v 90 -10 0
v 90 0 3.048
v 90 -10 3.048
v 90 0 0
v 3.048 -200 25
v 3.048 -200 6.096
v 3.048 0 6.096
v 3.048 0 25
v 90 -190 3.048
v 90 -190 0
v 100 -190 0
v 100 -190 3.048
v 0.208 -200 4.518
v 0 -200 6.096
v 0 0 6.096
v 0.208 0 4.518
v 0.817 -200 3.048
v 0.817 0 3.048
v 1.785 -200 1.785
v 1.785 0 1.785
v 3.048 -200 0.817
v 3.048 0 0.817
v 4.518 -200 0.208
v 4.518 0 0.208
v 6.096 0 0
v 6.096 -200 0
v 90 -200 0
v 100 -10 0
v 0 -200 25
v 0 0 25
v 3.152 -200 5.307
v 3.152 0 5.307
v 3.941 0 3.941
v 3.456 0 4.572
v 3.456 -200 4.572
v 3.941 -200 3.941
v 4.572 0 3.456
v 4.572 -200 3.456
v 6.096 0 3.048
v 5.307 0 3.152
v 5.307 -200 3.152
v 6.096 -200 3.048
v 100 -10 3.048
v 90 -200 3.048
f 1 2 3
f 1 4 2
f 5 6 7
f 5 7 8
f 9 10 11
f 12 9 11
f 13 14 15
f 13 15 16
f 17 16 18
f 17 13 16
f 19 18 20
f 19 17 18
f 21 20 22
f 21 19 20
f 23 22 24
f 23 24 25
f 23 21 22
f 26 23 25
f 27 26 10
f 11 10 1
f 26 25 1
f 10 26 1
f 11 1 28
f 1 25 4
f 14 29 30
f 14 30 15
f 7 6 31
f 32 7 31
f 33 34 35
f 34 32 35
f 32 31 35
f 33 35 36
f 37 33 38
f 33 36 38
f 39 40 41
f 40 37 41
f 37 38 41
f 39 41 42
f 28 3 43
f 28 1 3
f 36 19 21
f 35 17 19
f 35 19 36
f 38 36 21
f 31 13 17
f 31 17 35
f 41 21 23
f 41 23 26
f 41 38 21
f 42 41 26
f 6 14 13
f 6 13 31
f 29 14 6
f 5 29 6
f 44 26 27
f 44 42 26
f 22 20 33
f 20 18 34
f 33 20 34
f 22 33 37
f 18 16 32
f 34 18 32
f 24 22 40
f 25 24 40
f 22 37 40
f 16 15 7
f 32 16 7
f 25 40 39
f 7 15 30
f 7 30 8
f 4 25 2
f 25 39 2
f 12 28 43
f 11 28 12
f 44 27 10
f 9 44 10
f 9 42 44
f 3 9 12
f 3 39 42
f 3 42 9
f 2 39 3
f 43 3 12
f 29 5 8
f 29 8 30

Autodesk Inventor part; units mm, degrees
ref_plane "YZ Plane" through (0, 0, 0) normal (1, 0, 0) x (0, 1, 0)
ref_plane "XZ Plane" through (0, 0, 0) normal (0, 1, 0) x (-1, 0, 0)
ref_plane "XY Plane" through (0, 0, 0) normal (0, 0, 1) x (1, 0, 0)
sketch "Sketch1" plane through (0, 0, 0) normal (0, 0, 1) x (1, 0, 0)
  line L0 (0, 0) -> (100, 0)
  line L1 (100, 0) -> (100, -200)
  line L2 (100, -200) -> (0, -200)
  line L3 (0, -200) -> (0, 0)
  line L4 (100, 0) -> (90, 0)
  line L5 (90, 0) -> (90, -10)
  line L6 (90, -10) -> (100, -10)
  line L7 (100, -10) -> (100, 0)
  line L8 (100, -200) -> (90, -200)
  line L9 (90, -200) -> (90, -190)
  line L10 (90, -190) -> (100, -190)
  line L11 (100, -190) -> (100, -200)
  dimension "d0" = 100
  dimension "d1" = 200
  dimension "d2" = 10
  dimension "d3" = 10
extrude "Plate1" add sketch "Sketch1" along normal blind 3.048 contours L0 L5 L6 L1 L10 L9 L2 L3
sketch "Sketch2" plane through (0, 0, 3.048) normal (0, 0, 1) x (1, 0, 0)
  line L0 (13.9517, -33.0603) -> (49.292, -33.0603) construction
  line L1 (49.292, -33.0603) -> (49.292, -43.4735) construction
  line L2 (49.292, -43.4735) -> (13.9517, -43.4735) construction
  line L3 (13.9517, -43.4735) -> (13.9517, -33.0603) construction
  point P0 (0, 0)
mark "Mark1"
sketch "Sketch3" plane through (3.048, -200, 0) normal (-1, 0, 0) x (0, -1, 0)
  line L0 (-200, 0) -> (0, 0)
  line L1 (0, 0) -> (0, 25)
  line L2 (0, 25) -> (-200, 25)
  line L3 (-200, 25) -> (-200, 0)
edge flange "Flange1" height 25 angle 90 thickness 3.048 bend radius 3.048 thickness toward (-1, 0, 0) relief tear relief width 3.048 relief depth 1.524 edges at (0, -100, 3.048) wall of the first edge with corners at (3.048, 0, 0) (3.048, -200, 0) (3.048, -200, 25) (3.048, 0, 25)
bend "Bend1"
corner "Corner1"
equation "\"d4\" = Thickness"
equation "\"d5\" = BendReliefWidth"
equation "\"d6\" = BendReliefDepth"
equation "\"d7\" = MinimumRemnant"
equation "\"d8\" = TransitionRadius"
equation "\"d11\" = BendRadius"
equation "\"d12\" = CornerReliefSize"
equation "\"d13\" = GapSize"
equation "\"d14\" = JacobiRadiusSize"
equation "\"BendRadius\" = Thickness"
equation "\"BendReliefWidth\" = Thickness"
equation "\"BendReliefDepth\" = 0.5 * Thickness"
equation "\"CornerReliefSize\" = 4 * Thickness"
equation "\"MinimumRemnant\" = 2 * Thickness"
equation "\"TransitionRadius\" = BendRadius"
equation "\"JacobiRadiusSize\" = BendRadius"
equation "\"GapSize\" = Thickness"
equation "\"Thickness\" = 3.048"
